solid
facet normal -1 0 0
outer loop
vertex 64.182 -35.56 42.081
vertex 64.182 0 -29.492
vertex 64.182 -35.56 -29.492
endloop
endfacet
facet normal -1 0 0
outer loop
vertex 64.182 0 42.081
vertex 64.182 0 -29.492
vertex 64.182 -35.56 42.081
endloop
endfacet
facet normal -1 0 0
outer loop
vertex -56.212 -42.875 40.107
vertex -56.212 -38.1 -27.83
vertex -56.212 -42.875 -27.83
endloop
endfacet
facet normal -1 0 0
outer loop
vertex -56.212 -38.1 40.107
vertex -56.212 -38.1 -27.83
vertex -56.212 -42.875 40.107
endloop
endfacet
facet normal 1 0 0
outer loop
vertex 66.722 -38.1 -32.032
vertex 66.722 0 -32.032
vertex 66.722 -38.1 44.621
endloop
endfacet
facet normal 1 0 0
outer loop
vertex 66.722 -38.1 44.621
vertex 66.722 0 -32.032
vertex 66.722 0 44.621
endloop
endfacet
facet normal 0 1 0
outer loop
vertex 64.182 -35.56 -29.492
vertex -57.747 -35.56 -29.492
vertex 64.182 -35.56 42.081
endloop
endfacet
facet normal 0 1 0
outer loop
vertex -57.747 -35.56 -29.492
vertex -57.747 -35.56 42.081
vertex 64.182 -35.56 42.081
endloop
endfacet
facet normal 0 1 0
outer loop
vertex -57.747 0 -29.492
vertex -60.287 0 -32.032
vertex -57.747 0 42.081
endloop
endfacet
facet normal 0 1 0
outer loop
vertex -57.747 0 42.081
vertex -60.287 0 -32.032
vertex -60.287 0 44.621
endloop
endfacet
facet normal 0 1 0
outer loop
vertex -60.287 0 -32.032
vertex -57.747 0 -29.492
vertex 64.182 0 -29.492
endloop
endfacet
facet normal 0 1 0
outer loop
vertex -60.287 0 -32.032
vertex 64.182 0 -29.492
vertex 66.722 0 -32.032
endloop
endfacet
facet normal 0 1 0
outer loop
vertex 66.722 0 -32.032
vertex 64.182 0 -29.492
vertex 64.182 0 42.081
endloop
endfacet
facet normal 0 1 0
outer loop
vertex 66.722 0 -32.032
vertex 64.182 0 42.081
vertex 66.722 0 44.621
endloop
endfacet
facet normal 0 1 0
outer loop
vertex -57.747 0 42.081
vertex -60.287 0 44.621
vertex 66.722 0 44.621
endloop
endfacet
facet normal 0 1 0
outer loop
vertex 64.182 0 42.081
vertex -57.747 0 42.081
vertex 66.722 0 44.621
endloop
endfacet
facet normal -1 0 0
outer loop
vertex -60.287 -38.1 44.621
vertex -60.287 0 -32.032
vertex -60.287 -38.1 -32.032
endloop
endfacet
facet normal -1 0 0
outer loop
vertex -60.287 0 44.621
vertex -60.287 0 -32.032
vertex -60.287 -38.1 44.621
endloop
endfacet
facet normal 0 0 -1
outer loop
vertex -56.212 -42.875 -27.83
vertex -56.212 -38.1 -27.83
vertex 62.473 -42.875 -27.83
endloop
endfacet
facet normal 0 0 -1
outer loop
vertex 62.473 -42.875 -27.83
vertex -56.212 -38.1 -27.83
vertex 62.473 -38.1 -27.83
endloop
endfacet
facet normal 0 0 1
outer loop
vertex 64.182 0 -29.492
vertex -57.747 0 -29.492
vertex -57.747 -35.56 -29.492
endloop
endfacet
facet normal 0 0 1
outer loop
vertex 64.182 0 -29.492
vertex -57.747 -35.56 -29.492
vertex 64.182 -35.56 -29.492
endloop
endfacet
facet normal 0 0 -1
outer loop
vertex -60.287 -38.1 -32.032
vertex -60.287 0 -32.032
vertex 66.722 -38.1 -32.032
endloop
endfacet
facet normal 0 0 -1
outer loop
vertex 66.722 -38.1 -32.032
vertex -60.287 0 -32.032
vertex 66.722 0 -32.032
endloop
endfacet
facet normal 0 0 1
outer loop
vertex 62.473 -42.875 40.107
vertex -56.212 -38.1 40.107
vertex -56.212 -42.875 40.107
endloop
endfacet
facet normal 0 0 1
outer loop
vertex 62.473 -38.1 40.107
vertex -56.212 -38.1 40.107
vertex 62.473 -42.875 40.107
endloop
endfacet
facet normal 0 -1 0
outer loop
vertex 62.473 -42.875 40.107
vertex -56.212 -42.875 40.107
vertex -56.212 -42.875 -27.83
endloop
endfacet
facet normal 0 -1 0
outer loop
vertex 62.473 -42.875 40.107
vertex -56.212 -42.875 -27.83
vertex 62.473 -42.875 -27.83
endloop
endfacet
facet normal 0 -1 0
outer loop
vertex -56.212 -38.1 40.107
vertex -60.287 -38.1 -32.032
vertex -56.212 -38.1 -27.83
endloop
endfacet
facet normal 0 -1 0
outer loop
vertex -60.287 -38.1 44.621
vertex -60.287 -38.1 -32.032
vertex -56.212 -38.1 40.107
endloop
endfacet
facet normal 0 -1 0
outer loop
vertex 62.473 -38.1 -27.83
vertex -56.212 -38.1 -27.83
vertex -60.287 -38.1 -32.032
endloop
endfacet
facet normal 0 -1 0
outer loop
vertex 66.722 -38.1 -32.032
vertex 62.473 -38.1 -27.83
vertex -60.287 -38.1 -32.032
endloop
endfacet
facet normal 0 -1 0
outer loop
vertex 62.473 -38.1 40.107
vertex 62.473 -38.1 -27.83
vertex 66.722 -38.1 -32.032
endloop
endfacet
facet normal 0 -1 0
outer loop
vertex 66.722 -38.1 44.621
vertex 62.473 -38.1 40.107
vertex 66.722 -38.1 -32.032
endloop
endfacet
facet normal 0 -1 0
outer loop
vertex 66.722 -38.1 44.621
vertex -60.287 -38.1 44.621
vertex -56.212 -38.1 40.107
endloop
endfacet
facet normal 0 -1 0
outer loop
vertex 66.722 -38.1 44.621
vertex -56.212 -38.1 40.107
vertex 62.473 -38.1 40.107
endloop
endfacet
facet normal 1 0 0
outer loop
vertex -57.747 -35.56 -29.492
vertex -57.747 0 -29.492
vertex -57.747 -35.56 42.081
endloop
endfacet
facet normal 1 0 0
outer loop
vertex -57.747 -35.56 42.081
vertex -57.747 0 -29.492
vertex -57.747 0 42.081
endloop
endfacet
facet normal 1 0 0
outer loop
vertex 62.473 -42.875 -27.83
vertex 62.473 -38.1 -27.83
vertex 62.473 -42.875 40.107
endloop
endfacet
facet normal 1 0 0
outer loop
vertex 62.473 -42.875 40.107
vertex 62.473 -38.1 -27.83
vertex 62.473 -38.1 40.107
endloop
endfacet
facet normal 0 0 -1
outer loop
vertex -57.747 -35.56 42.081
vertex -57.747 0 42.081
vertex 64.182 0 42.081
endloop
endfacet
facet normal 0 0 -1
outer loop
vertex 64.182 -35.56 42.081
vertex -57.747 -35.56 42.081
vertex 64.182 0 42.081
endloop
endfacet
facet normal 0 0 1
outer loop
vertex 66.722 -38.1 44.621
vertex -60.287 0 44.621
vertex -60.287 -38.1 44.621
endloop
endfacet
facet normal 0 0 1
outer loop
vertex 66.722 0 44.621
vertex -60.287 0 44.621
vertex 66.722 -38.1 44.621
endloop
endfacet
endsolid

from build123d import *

# Parameters (mm, degrees)
F0_W     = 127.008882
F0_H     = 76.652937
F1_DEPTH = 38.1
F2_T     = -2.54
F3_W     = 118.68491
F3_H     = 67.936881
F4_DEPTH = 4.7752


with BuildPart() as f1:
    # F0 (on Front) → F1 (new body)
    with BuildSketch(Plane.XZ):
        with Locations((3.217185, 6.294493)):
            Rectangle(F0_W, F0_H)
    extrude(amount=F1_DEPTH)

    # F2
    f2_openings = [f1.faces().sort_by_distance(p)[0] for p in [
        (3.217185, 0, 6.294493),
    ]]
    offset(amount=F2_T, openings=f2_openings)

    # F3 (on face) → F4 (join)
    with BuildSketch(Plane.XZ.offset(38.1)):
        with Locations((3.130339, 6.138873)):
            Rectangle(F3_W, F3_H)
    extrude(amount=F4_DEPTH)


solid = f1.part
